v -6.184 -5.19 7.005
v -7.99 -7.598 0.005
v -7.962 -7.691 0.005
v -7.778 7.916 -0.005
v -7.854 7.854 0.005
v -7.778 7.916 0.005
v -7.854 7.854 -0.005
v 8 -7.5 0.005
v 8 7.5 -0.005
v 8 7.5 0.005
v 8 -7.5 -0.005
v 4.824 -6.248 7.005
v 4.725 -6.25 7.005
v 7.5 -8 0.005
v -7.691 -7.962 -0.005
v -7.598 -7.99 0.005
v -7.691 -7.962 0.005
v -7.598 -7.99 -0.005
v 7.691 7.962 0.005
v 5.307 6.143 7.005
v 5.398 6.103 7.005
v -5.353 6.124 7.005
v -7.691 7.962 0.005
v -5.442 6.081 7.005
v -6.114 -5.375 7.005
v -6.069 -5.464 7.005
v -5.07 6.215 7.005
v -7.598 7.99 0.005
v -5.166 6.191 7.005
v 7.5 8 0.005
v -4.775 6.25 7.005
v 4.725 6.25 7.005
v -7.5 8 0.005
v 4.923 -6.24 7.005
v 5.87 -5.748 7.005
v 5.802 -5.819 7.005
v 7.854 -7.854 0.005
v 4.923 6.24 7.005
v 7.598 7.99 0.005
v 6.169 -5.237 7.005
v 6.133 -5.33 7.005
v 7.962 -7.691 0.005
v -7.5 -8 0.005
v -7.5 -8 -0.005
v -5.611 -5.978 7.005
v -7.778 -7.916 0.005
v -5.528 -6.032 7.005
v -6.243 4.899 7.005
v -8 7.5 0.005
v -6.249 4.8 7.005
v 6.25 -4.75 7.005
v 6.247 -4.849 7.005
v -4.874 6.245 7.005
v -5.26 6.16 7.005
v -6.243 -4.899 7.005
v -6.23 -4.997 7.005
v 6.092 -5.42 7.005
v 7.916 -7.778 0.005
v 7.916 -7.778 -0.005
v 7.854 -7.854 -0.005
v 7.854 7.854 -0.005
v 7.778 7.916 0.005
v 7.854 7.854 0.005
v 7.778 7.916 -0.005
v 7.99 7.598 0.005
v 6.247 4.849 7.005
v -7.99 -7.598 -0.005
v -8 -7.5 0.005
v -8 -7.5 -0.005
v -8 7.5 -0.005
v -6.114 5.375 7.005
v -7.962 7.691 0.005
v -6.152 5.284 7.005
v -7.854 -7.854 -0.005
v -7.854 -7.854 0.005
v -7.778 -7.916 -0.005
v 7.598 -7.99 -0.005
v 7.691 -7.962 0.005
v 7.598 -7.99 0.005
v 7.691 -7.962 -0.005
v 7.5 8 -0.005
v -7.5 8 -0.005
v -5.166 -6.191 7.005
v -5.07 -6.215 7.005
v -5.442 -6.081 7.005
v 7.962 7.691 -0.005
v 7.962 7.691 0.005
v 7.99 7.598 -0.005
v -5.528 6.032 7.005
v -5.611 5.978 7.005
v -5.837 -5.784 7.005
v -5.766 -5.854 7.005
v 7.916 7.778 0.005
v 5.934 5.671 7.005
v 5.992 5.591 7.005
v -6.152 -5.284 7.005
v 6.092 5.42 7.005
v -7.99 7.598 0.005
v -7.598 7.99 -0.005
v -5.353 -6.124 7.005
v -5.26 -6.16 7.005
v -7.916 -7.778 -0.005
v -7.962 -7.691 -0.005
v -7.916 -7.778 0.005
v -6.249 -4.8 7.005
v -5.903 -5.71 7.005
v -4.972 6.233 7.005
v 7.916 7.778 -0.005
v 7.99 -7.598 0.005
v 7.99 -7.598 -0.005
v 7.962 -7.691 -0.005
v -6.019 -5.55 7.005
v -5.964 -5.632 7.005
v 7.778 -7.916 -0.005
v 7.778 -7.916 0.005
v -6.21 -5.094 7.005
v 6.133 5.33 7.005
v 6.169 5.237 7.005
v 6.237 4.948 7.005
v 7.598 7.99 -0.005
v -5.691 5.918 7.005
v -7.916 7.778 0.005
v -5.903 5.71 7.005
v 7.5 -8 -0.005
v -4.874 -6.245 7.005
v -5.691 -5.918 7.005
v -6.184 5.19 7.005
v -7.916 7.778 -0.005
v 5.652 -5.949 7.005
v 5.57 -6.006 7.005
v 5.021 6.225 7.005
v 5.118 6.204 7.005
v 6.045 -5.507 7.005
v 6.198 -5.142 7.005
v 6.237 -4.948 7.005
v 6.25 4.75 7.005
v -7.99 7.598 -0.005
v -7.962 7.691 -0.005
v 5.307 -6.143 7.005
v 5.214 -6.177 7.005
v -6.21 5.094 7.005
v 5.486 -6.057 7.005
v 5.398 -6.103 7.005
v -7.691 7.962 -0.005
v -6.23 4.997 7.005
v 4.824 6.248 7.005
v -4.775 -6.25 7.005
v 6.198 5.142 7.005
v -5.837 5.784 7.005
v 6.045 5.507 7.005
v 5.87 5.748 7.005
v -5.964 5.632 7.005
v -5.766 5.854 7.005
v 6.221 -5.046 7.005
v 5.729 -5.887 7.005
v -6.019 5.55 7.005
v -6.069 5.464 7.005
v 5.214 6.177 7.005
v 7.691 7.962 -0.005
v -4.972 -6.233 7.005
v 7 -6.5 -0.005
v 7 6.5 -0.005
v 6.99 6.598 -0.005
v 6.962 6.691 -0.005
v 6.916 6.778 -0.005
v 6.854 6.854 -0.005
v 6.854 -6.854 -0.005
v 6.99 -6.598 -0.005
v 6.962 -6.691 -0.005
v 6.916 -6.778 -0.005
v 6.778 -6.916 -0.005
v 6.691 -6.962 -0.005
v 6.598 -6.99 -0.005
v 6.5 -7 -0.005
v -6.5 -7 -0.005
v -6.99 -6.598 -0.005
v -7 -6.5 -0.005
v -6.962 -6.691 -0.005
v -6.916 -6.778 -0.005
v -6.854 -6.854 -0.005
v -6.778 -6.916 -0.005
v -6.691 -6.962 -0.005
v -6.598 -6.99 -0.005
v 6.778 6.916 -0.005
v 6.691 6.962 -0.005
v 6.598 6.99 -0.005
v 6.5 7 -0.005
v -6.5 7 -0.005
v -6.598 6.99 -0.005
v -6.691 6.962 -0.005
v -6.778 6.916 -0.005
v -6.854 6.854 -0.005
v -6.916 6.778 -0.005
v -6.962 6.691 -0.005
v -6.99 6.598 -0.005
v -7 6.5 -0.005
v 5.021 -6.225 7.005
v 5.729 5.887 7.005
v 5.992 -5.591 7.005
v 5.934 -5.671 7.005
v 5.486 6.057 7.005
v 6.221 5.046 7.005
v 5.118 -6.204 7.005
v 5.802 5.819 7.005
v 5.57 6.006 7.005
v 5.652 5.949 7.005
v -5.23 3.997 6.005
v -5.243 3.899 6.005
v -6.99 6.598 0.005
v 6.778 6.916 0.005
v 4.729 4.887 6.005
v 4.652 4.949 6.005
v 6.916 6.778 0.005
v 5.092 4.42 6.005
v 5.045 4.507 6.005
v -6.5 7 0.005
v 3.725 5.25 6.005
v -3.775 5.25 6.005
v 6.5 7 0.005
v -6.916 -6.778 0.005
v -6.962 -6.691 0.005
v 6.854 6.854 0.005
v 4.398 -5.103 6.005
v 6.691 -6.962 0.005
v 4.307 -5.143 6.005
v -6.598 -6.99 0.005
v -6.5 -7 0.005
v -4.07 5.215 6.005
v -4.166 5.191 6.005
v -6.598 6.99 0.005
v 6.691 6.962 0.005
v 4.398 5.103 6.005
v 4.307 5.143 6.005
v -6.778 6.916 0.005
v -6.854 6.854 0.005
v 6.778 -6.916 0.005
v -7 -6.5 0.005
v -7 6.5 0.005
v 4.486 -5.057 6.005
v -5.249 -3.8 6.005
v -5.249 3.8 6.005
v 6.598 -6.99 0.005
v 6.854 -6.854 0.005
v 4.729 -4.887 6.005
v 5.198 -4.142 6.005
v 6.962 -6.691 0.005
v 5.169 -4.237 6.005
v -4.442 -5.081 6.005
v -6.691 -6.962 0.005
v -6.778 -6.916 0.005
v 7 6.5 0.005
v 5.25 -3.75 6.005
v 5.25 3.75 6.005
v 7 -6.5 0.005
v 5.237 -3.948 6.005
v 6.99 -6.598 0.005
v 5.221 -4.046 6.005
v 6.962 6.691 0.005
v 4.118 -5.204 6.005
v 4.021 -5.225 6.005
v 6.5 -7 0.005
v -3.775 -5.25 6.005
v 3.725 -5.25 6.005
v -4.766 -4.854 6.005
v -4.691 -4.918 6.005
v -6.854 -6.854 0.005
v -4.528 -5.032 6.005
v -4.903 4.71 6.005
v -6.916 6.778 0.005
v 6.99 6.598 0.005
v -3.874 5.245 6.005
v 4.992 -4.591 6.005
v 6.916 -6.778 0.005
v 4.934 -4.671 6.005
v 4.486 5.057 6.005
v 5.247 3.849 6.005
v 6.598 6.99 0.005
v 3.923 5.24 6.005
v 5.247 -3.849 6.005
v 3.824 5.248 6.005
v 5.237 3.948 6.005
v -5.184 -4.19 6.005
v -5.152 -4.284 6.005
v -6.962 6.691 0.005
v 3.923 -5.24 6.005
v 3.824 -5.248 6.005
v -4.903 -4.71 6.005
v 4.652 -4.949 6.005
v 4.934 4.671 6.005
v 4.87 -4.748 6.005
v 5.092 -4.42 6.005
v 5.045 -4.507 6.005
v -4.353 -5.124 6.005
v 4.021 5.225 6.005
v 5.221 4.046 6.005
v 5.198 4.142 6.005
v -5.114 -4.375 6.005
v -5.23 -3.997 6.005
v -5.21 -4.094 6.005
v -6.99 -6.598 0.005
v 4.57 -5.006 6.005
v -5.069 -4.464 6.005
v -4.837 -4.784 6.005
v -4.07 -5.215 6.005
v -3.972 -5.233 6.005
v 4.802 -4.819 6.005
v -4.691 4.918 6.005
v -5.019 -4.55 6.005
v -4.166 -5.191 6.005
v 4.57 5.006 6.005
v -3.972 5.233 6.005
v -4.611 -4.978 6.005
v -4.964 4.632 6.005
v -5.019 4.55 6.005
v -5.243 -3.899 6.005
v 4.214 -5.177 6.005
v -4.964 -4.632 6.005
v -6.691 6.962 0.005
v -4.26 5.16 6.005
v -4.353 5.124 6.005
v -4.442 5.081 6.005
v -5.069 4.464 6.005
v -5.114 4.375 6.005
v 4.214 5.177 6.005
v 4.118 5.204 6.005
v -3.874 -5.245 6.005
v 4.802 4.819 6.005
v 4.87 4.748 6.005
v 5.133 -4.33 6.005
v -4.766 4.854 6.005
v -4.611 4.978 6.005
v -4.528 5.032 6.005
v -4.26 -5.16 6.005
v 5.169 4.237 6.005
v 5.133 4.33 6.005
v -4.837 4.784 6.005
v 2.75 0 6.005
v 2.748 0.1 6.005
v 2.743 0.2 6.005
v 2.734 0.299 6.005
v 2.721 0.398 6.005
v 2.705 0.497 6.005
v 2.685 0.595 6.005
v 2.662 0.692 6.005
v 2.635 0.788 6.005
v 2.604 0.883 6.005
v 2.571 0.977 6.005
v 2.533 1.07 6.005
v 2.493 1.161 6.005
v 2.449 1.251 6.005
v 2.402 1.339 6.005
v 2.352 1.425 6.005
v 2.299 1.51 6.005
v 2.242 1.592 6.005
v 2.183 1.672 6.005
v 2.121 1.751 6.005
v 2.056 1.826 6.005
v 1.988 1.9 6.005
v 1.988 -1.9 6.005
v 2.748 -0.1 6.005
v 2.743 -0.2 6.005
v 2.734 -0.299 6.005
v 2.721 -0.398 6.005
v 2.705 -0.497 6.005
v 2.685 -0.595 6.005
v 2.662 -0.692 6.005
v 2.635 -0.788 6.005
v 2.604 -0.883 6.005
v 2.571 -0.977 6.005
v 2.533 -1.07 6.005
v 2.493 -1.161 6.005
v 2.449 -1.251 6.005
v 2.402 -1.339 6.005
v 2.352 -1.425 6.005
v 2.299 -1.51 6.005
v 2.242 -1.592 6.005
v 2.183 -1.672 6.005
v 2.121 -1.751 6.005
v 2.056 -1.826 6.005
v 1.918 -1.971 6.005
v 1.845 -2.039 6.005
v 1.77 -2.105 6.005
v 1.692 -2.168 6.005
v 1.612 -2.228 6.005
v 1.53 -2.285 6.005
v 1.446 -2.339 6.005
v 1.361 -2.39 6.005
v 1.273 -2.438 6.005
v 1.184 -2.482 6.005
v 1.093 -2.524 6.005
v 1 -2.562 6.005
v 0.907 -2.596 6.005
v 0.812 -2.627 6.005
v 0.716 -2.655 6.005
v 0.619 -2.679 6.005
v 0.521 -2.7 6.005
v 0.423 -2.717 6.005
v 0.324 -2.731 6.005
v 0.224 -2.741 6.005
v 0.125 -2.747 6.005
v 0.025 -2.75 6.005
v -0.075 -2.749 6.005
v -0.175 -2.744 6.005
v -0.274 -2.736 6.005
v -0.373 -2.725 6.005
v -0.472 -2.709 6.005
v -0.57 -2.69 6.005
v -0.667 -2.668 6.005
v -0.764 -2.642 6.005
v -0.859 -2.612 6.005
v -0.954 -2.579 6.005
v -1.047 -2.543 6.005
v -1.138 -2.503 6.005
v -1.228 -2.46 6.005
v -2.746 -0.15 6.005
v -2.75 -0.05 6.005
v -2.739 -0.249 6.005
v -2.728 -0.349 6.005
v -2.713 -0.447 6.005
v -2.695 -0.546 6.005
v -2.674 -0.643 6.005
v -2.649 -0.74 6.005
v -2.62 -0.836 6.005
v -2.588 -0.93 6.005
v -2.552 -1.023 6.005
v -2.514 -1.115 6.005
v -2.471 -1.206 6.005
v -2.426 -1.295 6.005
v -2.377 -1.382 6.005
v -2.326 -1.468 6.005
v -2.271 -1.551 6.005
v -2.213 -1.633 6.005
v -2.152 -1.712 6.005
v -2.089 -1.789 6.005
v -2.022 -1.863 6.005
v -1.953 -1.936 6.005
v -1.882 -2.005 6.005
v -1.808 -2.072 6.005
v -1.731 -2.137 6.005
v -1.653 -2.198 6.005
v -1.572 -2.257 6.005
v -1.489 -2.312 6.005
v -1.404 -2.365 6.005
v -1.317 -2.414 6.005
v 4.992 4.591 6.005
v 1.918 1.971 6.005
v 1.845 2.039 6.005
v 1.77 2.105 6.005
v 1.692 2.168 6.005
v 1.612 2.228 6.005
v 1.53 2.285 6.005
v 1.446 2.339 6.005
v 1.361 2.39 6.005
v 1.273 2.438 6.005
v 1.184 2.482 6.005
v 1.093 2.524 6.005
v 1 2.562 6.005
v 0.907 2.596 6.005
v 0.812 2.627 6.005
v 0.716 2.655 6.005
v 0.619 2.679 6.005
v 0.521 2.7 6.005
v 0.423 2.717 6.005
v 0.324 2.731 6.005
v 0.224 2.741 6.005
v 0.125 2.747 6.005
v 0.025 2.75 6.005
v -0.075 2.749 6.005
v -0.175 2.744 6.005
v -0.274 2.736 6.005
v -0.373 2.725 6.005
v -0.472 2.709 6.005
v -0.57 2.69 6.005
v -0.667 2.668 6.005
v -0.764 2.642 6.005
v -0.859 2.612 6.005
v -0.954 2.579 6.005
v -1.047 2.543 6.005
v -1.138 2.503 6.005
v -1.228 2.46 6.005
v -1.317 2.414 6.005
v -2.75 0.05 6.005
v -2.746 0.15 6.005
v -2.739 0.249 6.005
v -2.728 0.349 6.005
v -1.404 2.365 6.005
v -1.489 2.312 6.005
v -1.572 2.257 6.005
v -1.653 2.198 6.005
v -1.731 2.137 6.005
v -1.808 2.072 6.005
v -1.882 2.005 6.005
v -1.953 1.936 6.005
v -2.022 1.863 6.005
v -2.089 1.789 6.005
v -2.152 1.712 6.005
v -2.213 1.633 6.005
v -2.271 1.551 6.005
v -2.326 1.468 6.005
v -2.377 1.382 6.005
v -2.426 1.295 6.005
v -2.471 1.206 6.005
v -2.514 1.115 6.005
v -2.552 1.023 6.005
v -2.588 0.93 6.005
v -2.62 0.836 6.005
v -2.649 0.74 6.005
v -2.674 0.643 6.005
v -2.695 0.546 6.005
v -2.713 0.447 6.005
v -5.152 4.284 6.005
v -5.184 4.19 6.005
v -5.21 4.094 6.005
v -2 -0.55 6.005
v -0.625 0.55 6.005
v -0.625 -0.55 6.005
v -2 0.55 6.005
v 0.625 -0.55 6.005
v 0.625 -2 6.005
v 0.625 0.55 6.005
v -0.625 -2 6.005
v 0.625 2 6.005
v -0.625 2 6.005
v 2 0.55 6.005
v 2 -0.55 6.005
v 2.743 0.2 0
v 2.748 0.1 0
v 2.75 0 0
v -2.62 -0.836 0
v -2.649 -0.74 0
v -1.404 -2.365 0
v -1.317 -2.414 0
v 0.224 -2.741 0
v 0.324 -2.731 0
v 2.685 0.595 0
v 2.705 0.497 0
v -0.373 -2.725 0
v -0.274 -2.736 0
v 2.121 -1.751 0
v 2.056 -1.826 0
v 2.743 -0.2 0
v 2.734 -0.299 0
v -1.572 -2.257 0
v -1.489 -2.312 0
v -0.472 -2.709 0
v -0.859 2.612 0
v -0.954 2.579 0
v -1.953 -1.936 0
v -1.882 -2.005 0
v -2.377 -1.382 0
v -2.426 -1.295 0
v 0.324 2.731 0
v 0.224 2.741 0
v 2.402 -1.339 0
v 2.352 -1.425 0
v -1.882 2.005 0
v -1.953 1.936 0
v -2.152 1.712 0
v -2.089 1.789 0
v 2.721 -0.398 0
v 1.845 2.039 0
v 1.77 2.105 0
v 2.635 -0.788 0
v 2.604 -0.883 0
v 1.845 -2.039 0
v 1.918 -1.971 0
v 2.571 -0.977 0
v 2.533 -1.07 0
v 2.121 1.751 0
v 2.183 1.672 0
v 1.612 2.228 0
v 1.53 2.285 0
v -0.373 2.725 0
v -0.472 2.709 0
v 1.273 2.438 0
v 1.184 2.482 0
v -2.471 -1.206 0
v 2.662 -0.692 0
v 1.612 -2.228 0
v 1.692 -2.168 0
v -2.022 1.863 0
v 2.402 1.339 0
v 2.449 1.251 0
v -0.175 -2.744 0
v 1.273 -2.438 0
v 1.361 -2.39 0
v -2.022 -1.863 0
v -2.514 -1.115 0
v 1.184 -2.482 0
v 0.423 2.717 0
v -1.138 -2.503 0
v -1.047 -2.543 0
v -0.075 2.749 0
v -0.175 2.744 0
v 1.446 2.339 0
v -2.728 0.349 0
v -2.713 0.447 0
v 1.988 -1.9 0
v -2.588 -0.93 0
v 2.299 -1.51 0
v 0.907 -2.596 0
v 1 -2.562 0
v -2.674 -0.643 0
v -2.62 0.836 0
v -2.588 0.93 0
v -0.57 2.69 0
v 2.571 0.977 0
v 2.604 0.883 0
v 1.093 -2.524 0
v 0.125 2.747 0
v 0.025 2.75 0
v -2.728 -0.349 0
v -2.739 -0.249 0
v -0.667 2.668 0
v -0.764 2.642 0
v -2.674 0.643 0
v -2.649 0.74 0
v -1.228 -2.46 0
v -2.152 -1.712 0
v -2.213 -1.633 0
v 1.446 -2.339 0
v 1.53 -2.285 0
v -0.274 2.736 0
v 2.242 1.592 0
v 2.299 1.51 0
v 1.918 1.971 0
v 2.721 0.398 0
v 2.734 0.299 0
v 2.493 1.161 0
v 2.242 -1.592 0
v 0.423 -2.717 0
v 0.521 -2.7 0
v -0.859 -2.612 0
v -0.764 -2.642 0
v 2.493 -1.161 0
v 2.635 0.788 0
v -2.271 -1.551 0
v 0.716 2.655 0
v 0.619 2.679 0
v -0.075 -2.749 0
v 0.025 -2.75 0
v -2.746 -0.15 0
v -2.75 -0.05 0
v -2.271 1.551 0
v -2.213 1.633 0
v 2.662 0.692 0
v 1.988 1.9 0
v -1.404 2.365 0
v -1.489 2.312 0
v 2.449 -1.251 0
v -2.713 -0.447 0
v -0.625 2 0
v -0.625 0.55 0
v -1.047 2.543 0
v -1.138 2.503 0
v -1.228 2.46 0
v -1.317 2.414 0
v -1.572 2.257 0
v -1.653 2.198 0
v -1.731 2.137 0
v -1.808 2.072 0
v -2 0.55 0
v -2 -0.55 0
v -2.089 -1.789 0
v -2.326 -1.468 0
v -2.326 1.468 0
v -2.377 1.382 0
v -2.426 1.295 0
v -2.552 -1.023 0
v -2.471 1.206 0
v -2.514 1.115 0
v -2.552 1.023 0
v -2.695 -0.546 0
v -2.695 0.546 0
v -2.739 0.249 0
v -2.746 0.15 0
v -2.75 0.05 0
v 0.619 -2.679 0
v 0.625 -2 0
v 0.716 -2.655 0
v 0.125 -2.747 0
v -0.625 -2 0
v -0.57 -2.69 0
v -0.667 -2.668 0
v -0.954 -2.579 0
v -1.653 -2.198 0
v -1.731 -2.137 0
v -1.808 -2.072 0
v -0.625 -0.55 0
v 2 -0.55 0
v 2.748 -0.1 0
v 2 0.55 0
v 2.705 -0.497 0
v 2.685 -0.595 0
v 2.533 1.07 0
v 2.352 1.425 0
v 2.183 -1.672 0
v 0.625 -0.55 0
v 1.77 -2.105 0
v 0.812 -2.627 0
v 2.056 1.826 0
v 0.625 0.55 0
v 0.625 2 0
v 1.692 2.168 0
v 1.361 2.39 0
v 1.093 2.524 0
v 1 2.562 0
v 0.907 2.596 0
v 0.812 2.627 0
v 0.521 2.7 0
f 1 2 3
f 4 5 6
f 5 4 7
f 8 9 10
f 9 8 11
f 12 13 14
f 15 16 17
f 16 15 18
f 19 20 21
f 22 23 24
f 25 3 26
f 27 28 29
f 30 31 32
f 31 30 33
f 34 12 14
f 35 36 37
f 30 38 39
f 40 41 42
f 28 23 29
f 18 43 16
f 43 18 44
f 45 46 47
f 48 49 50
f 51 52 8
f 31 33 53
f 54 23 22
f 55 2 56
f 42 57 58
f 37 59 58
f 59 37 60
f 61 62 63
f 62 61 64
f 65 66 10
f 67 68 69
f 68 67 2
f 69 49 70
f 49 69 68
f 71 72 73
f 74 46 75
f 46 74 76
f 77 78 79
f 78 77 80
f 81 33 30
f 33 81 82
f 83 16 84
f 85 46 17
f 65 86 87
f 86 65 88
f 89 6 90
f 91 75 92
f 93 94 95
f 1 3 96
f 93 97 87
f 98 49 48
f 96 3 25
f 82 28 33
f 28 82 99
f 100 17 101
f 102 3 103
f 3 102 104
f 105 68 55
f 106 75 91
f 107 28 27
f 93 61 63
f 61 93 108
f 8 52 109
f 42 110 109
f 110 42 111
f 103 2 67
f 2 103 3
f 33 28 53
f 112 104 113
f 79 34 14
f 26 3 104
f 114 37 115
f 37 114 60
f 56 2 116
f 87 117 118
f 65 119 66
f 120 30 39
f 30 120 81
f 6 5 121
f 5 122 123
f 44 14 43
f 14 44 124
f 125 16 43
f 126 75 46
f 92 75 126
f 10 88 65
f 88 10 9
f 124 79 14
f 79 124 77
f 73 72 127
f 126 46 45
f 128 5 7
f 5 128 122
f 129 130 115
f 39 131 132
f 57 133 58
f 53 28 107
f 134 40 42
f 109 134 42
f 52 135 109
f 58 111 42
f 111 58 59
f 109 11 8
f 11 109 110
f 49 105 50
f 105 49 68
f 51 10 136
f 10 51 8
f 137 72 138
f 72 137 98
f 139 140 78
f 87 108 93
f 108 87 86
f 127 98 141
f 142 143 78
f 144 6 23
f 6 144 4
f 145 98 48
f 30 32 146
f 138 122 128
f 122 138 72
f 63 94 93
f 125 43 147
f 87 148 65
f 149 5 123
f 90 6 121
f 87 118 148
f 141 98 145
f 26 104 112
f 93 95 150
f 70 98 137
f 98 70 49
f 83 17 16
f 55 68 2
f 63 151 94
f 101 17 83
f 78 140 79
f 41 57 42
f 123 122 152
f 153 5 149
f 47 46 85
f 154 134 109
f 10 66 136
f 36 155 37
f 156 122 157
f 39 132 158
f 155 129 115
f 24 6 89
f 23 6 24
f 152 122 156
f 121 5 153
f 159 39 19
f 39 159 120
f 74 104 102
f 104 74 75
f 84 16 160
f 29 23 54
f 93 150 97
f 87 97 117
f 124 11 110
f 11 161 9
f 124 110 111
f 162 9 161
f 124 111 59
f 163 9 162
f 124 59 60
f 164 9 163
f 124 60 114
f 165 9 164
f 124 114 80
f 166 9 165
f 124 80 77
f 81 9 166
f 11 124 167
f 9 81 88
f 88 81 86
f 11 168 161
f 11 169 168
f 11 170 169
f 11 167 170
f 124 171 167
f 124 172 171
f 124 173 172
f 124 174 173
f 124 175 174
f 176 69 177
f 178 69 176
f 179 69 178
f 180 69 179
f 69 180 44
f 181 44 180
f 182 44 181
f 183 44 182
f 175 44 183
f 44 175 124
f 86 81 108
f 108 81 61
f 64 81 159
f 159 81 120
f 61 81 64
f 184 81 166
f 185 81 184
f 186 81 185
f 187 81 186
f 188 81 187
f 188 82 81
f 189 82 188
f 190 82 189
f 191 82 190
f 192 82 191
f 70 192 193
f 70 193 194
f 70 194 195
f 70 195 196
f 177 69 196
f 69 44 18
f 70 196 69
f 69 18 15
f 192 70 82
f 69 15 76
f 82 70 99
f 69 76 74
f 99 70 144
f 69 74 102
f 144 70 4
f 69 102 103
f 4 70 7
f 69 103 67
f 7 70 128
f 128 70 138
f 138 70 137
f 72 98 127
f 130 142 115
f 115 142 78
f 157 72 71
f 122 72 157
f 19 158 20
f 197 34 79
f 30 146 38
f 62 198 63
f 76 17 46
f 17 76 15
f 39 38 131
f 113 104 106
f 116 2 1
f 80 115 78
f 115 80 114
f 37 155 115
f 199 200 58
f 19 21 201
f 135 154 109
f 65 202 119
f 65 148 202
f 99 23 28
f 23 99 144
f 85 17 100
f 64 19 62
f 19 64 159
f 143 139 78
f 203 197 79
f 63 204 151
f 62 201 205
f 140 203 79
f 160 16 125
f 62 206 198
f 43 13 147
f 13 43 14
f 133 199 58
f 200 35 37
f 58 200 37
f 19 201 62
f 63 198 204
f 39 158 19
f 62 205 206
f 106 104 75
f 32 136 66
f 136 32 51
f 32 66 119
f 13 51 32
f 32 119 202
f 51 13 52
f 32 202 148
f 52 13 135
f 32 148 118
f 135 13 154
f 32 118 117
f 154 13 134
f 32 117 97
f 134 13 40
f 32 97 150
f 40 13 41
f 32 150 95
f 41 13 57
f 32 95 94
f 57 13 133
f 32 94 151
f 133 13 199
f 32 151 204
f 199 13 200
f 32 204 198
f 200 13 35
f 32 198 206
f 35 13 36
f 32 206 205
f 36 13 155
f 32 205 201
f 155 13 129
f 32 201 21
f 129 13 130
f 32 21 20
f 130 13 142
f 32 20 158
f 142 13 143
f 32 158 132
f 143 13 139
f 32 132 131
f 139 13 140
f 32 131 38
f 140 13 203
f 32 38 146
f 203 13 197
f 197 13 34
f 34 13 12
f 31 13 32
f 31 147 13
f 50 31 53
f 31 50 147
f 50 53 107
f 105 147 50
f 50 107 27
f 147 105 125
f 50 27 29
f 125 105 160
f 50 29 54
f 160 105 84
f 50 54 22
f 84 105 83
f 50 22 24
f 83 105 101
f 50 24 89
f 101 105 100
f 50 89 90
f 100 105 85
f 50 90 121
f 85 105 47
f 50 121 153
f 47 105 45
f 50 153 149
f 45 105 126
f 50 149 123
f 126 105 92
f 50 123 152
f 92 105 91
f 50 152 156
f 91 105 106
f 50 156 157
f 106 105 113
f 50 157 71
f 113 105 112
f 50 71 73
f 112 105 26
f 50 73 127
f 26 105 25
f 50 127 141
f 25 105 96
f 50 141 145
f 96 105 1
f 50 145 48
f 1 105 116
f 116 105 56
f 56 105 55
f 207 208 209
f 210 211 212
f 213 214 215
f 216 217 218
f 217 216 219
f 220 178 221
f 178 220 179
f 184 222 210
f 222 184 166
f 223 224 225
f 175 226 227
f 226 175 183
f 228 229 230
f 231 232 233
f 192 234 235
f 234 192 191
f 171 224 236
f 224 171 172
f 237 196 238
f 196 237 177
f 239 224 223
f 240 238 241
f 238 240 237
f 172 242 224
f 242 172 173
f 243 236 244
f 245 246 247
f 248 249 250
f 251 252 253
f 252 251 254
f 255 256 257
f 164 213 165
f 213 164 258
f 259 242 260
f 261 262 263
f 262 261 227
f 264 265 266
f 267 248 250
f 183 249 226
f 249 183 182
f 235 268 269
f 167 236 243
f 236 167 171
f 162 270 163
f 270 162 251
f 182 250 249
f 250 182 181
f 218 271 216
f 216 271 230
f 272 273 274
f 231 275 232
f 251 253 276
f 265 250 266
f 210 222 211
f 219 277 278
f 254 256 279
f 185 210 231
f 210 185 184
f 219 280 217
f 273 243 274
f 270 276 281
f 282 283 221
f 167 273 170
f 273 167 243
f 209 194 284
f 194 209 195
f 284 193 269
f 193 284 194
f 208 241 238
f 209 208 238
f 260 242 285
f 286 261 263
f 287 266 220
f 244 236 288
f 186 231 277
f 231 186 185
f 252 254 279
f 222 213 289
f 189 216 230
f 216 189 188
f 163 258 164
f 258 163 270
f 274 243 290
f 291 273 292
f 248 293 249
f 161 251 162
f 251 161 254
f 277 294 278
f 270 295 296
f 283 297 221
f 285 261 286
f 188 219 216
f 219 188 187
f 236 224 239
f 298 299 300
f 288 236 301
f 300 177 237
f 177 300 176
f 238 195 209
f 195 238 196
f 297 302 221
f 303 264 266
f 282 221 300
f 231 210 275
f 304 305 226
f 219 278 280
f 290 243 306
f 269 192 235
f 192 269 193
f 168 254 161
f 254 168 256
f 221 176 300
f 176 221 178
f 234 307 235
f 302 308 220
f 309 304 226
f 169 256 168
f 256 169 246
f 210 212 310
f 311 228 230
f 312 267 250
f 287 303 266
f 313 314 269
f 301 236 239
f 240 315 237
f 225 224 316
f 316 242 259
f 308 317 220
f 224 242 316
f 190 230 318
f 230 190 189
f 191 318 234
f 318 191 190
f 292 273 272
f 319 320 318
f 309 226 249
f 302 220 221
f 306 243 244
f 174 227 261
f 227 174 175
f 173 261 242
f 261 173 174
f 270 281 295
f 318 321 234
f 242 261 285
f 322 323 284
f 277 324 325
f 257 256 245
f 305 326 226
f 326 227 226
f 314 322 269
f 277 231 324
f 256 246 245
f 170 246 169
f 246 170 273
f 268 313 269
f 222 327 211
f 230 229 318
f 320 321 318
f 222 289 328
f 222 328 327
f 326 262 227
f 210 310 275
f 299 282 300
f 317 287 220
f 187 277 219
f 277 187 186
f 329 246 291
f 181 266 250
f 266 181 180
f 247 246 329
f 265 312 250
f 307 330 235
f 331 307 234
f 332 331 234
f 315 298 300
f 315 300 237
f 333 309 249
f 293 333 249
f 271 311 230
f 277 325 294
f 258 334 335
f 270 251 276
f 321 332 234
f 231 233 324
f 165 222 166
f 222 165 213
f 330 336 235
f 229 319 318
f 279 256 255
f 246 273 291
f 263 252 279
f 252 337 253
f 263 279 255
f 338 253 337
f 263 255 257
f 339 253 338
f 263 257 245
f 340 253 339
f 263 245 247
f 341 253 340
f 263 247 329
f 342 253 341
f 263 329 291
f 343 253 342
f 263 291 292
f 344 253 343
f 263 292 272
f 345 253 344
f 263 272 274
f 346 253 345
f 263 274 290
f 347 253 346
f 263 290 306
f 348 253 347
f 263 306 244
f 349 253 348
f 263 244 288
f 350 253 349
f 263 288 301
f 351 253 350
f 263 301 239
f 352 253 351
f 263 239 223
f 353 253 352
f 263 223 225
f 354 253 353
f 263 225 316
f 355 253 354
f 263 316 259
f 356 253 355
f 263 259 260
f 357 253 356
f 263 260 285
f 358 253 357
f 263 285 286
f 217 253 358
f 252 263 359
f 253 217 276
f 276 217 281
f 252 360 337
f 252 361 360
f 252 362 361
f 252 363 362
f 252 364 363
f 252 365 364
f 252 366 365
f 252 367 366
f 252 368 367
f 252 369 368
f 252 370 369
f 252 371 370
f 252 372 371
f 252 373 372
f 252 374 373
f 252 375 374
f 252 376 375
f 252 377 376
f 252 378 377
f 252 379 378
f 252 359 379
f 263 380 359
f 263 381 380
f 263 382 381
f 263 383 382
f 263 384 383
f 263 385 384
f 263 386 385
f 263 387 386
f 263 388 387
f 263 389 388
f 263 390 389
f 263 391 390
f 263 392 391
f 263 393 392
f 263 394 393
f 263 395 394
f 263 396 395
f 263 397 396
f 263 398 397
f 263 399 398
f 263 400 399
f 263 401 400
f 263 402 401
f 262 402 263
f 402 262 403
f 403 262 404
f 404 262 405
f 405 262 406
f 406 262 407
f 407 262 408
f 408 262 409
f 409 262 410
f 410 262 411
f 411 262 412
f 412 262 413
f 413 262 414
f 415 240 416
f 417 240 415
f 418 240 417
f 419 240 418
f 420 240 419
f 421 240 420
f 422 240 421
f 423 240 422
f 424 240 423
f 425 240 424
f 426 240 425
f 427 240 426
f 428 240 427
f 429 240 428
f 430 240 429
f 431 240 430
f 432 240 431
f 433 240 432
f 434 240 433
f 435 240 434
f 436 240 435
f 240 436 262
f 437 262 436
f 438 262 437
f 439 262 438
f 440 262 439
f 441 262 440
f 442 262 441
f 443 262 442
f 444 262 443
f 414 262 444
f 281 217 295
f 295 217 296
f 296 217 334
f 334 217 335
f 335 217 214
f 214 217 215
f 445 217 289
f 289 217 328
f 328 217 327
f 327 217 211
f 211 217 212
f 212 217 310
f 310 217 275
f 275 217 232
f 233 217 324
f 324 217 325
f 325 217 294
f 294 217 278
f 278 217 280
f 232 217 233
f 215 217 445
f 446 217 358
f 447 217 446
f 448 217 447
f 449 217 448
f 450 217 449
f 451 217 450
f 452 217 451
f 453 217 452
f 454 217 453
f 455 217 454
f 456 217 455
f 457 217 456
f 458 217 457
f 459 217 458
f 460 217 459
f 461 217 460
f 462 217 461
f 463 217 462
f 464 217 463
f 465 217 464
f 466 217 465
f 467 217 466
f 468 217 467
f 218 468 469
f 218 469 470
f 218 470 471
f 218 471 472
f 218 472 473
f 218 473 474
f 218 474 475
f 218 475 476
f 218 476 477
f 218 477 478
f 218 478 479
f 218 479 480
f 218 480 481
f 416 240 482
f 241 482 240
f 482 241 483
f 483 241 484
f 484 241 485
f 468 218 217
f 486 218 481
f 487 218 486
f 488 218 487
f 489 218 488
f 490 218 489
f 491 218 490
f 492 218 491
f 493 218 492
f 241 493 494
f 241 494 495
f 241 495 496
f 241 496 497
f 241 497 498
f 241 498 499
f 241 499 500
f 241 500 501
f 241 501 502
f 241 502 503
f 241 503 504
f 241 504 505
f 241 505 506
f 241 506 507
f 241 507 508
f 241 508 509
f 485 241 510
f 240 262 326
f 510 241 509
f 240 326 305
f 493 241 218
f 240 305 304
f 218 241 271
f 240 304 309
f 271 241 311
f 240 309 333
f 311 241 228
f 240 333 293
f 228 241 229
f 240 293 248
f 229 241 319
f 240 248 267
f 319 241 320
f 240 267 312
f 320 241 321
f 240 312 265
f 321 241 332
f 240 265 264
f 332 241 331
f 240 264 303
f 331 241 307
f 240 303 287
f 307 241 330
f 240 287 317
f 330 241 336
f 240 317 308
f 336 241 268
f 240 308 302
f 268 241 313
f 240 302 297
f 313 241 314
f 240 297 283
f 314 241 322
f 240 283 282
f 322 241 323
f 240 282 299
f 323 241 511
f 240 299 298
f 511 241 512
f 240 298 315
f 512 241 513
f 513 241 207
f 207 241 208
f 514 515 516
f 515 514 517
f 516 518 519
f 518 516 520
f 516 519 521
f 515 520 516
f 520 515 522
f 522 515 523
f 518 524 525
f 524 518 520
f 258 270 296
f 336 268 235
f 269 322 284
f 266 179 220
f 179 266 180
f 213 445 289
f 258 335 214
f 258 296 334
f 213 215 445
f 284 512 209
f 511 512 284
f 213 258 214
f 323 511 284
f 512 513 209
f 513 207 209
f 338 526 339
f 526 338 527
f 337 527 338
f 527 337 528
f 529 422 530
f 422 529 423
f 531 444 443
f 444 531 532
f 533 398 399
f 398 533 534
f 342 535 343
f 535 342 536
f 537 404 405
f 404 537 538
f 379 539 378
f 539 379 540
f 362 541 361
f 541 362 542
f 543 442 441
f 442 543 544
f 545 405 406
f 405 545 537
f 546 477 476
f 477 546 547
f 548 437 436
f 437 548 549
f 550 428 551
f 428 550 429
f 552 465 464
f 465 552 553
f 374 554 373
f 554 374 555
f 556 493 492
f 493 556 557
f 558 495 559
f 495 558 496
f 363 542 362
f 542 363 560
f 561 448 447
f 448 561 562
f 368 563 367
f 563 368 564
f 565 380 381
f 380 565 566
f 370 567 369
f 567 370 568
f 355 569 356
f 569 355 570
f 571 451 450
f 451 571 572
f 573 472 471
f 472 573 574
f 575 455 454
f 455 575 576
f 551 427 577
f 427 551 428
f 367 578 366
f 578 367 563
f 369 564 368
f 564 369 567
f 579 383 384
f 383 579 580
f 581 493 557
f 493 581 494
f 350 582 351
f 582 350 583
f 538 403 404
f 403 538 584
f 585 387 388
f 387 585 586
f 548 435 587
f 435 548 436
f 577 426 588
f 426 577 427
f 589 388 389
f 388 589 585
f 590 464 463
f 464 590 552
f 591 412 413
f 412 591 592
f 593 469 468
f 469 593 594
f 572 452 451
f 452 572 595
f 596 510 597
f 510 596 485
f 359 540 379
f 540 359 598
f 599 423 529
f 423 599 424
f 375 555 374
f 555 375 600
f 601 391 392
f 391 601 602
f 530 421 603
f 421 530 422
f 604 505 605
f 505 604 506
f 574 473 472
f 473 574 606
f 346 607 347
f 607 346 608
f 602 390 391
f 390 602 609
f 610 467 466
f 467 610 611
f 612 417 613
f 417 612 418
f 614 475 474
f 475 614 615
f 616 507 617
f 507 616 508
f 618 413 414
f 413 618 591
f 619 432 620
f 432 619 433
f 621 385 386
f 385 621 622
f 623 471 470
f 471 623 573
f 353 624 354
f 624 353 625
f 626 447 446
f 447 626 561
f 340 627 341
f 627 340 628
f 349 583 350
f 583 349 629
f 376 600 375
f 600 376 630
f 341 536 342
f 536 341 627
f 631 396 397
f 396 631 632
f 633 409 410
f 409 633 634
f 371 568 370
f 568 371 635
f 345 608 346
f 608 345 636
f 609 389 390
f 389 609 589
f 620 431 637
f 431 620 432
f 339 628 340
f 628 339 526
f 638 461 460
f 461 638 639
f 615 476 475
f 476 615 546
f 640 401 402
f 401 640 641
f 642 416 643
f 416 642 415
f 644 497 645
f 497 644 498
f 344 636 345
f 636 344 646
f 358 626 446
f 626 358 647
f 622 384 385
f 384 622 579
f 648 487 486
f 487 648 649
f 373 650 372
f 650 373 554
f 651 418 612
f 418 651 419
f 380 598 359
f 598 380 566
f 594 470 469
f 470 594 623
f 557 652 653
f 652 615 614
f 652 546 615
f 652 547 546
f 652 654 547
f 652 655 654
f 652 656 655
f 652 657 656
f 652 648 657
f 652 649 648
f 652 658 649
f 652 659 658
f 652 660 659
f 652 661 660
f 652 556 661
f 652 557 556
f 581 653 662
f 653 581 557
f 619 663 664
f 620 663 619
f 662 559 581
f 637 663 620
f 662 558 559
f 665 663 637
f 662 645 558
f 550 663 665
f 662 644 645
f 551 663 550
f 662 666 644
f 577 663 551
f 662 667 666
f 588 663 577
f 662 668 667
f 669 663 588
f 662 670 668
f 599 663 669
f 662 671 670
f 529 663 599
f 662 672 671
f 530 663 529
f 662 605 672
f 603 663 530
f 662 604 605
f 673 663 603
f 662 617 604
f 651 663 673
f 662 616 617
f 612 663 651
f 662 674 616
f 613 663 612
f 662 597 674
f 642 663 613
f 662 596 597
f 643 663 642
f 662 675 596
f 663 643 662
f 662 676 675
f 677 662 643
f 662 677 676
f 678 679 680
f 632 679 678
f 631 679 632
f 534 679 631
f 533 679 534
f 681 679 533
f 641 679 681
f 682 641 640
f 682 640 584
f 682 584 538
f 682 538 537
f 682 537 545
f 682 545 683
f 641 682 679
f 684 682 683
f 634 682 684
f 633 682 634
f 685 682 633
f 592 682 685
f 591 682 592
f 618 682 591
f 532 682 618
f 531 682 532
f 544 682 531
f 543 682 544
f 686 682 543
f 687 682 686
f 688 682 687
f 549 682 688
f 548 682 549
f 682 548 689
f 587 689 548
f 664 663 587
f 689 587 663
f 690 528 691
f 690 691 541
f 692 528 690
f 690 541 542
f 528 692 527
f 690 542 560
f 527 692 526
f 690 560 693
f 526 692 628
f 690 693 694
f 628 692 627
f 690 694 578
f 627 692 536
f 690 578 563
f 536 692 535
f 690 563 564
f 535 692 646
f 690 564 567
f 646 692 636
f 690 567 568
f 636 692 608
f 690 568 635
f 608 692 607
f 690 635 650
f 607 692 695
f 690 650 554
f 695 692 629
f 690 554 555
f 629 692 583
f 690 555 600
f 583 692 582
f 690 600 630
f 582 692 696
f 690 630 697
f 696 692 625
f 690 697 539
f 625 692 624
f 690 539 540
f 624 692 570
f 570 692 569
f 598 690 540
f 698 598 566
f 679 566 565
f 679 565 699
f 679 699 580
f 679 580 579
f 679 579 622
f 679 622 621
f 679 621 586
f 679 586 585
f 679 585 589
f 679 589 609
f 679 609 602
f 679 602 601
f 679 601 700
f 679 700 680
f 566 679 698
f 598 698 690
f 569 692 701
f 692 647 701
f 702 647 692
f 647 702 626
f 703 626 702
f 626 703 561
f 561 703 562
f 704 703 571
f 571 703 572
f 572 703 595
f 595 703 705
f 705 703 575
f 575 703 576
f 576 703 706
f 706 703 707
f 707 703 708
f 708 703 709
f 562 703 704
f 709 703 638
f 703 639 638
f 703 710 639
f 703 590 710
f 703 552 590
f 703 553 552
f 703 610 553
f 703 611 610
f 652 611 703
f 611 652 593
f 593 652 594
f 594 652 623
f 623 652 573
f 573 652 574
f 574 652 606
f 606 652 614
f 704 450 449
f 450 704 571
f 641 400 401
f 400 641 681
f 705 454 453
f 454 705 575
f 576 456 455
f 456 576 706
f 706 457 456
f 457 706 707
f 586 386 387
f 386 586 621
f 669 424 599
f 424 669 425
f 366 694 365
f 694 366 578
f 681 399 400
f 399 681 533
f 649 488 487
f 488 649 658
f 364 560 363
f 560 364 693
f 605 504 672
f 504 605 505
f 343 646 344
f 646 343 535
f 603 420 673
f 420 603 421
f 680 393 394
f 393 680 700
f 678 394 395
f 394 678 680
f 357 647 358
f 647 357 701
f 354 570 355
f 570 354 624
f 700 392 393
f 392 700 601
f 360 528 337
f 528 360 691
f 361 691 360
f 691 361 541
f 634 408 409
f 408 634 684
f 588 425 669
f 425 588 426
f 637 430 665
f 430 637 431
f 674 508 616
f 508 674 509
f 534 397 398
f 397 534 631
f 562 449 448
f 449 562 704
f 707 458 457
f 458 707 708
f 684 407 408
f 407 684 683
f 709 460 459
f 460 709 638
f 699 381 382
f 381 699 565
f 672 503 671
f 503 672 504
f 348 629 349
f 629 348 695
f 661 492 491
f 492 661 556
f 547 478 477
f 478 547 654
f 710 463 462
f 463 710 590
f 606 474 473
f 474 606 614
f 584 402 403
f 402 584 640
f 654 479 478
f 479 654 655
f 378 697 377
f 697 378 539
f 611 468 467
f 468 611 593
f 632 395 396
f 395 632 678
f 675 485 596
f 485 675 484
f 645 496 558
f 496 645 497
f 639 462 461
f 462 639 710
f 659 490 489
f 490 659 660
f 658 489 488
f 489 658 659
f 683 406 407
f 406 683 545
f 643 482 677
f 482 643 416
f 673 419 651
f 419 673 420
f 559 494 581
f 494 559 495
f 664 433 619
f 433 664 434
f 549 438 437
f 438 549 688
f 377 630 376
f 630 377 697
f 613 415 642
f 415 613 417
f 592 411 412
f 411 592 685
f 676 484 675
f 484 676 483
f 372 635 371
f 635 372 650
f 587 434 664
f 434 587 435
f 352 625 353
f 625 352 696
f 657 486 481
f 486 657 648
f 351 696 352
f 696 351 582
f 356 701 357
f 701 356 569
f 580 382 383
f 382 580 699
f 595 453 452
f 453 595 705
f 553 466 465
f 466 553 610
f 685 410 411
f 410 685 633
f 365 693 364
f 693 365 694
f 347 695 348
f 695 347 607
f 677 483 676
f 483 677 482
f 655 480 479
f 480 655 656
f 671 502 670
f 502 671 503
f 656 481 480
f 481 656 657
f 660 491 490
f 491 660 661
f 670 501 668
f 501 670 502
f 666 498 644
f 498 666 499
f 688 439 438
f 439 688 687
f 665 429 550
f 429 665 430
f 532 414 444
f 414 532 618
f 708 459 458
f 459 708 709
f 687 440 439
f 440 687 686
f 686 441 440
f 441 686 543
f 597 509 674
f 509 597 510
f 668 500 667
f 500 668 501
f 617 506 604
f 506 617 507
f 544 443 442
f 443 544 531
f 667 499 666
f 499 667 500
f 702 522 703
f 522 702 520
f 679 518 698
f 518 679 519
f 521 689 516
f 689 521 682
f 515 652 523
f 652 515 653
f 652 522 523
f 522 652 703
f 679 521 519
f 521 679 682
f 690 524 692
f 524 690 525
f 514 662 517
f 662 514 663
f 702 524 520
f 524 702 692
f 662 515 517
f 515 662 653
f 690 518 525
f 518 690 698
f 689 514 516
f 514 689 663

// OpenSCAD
// file: stem.scad
$fs = 0.1;

// --------
// ステム
// --------
stem_outer_size = 5.5;
stem_cross_length = 4.0;
stem_cross_h = 1.25;
stem_cross_v = 1.10;

module stem() {
  difference () {
    cylinder(d = stem_outer_size, h=15);
    // 十字部分
    translate([0, 0, 15 / 2])
      cube([stem_cross_h, stem_cross_length, 15], center = true);
    translate([0, 0, 15 / 2])
      cube([stem_cross_length, stem_cross_v, 15], center = true);
  }
}
// file: keycap_base.scad
$fs = 0.1;
$fa = 0.25;  // くり抜く円柱を作成のため、精度を上げる

use <stem.scad>

key_bottom = 16;
key_top = 12.5;

base_height = 7;

// --------
// キャップ部分
// --------

// 角が丸い四角
module rounded_cube(size, r) {
  // cylinder の高さ (適当な値)
  h = 0.0001;
  minkowski() {
    cube([size[0] - r*2, size[1] - r*2, size[2] - h], center = true);
    cylinder(r = r, h = h);
  }
}

// くり抜くための円を作成する
function dish_r(w, d) = (w * w + 4 * d) / (8 * d);

// 四角
module keycap_outer_shape (key_bottom_size, key_top_size, key_top_height, angle, dish_depth) {
  difference() {
    // 基本的なキーキャップを作成
    hull() {
      // cherry プロファイルっぽく上にずらす
      translate([0, 0, key_top_height])
        rotate([- angle,  0, 0])
          rounded_cube([key_top_size, key_top_size, 0.01], 1.5);
      rounded_cube([key_bottom_size, key_bottom_size, 0.01], 0.5);
    }

    // くり抜く円柱を作成
    translate([0, 0, key_top_height])
      rotate([- angle, 0, 0])
      translate([0, 0, dish_r(key_top_size, dish_depth) - dish_depth])
        rotate([90, 0, 0])
        cylinder(r = dish_r(key_top_size, dish_depth), h = 60, center = true);
  }
}

// キーキャップのくり抜くための四角
module keycap_inner_shape(bottom, top, height, angle, depth) {
    thickness = 1;
    keycap_outer_shape(bottom - (thickness * 2), top - (thickness * 2), height - thickness, angle, depth);
}

// スイッチ部分をくり抜いてキーキャップを作成
module keycap_shape(bottom, top, height, angle) {
  depth = 0.8;
  difference () {
    keycap_outer_shape(bottom, top, height, angle, depth); 
    keycap_inner_shape(bottom, top, height, angle, depth);
  }
}

module keycap(key_height, key_angle) {

  keycap_shape(key_bottom, key_top, key_height, key_angle);

  // キーキャップと合わせられるステムを作成
  intersection() {
    stem();
    // キートップの厚さは1.5mmとする
    keycap_outer_shape(key_bottom, key_top, key_height, key_angle, 1.5);
  }
}
// main file
include <keycap_base.scad>

// 四角
module keycap_outer_shape (key_bottom_size, key_top_size, key_top_height, angle, dish_depth) {
  top_r = 1.5;
  bottom_r = 0.5;

  // 基本的なキーキャップを作成
  hull() {
    translate([0, 0, key_top_height])
      rotate([- angle,  0, 0])
        rounded_cube([key_top_size, key_top_size, 0.01], top_r);
    rounded_cube([key_bottom_size, key_bottom_size, 0.01], bottom_r);
  }
}

// スイッチ部分をくり抜いてキーキャップを作成
module keycap_shape(bottom, top, height, angle) {
  depth = 0.8;
  difference () {
    keycap_outer_shape(bottom, top, height, angle, depth); 
    keycap_inner_shape(bottom, top, height, angle, depth);
  }
}

module keycap(key_height, key_angle) {
  keycap_shape(key_bottom, key_top, key_height, key_angle);

  // キーキャップと合わせられるステムを作成
  intersection() {
    stem();
    // キートップの厚さは1.5mmとする
    keycap_outer_shape(key_bottom, key_top, key_height, key_angle, 1.5);
  }
}

keycap(base_height, 0);
